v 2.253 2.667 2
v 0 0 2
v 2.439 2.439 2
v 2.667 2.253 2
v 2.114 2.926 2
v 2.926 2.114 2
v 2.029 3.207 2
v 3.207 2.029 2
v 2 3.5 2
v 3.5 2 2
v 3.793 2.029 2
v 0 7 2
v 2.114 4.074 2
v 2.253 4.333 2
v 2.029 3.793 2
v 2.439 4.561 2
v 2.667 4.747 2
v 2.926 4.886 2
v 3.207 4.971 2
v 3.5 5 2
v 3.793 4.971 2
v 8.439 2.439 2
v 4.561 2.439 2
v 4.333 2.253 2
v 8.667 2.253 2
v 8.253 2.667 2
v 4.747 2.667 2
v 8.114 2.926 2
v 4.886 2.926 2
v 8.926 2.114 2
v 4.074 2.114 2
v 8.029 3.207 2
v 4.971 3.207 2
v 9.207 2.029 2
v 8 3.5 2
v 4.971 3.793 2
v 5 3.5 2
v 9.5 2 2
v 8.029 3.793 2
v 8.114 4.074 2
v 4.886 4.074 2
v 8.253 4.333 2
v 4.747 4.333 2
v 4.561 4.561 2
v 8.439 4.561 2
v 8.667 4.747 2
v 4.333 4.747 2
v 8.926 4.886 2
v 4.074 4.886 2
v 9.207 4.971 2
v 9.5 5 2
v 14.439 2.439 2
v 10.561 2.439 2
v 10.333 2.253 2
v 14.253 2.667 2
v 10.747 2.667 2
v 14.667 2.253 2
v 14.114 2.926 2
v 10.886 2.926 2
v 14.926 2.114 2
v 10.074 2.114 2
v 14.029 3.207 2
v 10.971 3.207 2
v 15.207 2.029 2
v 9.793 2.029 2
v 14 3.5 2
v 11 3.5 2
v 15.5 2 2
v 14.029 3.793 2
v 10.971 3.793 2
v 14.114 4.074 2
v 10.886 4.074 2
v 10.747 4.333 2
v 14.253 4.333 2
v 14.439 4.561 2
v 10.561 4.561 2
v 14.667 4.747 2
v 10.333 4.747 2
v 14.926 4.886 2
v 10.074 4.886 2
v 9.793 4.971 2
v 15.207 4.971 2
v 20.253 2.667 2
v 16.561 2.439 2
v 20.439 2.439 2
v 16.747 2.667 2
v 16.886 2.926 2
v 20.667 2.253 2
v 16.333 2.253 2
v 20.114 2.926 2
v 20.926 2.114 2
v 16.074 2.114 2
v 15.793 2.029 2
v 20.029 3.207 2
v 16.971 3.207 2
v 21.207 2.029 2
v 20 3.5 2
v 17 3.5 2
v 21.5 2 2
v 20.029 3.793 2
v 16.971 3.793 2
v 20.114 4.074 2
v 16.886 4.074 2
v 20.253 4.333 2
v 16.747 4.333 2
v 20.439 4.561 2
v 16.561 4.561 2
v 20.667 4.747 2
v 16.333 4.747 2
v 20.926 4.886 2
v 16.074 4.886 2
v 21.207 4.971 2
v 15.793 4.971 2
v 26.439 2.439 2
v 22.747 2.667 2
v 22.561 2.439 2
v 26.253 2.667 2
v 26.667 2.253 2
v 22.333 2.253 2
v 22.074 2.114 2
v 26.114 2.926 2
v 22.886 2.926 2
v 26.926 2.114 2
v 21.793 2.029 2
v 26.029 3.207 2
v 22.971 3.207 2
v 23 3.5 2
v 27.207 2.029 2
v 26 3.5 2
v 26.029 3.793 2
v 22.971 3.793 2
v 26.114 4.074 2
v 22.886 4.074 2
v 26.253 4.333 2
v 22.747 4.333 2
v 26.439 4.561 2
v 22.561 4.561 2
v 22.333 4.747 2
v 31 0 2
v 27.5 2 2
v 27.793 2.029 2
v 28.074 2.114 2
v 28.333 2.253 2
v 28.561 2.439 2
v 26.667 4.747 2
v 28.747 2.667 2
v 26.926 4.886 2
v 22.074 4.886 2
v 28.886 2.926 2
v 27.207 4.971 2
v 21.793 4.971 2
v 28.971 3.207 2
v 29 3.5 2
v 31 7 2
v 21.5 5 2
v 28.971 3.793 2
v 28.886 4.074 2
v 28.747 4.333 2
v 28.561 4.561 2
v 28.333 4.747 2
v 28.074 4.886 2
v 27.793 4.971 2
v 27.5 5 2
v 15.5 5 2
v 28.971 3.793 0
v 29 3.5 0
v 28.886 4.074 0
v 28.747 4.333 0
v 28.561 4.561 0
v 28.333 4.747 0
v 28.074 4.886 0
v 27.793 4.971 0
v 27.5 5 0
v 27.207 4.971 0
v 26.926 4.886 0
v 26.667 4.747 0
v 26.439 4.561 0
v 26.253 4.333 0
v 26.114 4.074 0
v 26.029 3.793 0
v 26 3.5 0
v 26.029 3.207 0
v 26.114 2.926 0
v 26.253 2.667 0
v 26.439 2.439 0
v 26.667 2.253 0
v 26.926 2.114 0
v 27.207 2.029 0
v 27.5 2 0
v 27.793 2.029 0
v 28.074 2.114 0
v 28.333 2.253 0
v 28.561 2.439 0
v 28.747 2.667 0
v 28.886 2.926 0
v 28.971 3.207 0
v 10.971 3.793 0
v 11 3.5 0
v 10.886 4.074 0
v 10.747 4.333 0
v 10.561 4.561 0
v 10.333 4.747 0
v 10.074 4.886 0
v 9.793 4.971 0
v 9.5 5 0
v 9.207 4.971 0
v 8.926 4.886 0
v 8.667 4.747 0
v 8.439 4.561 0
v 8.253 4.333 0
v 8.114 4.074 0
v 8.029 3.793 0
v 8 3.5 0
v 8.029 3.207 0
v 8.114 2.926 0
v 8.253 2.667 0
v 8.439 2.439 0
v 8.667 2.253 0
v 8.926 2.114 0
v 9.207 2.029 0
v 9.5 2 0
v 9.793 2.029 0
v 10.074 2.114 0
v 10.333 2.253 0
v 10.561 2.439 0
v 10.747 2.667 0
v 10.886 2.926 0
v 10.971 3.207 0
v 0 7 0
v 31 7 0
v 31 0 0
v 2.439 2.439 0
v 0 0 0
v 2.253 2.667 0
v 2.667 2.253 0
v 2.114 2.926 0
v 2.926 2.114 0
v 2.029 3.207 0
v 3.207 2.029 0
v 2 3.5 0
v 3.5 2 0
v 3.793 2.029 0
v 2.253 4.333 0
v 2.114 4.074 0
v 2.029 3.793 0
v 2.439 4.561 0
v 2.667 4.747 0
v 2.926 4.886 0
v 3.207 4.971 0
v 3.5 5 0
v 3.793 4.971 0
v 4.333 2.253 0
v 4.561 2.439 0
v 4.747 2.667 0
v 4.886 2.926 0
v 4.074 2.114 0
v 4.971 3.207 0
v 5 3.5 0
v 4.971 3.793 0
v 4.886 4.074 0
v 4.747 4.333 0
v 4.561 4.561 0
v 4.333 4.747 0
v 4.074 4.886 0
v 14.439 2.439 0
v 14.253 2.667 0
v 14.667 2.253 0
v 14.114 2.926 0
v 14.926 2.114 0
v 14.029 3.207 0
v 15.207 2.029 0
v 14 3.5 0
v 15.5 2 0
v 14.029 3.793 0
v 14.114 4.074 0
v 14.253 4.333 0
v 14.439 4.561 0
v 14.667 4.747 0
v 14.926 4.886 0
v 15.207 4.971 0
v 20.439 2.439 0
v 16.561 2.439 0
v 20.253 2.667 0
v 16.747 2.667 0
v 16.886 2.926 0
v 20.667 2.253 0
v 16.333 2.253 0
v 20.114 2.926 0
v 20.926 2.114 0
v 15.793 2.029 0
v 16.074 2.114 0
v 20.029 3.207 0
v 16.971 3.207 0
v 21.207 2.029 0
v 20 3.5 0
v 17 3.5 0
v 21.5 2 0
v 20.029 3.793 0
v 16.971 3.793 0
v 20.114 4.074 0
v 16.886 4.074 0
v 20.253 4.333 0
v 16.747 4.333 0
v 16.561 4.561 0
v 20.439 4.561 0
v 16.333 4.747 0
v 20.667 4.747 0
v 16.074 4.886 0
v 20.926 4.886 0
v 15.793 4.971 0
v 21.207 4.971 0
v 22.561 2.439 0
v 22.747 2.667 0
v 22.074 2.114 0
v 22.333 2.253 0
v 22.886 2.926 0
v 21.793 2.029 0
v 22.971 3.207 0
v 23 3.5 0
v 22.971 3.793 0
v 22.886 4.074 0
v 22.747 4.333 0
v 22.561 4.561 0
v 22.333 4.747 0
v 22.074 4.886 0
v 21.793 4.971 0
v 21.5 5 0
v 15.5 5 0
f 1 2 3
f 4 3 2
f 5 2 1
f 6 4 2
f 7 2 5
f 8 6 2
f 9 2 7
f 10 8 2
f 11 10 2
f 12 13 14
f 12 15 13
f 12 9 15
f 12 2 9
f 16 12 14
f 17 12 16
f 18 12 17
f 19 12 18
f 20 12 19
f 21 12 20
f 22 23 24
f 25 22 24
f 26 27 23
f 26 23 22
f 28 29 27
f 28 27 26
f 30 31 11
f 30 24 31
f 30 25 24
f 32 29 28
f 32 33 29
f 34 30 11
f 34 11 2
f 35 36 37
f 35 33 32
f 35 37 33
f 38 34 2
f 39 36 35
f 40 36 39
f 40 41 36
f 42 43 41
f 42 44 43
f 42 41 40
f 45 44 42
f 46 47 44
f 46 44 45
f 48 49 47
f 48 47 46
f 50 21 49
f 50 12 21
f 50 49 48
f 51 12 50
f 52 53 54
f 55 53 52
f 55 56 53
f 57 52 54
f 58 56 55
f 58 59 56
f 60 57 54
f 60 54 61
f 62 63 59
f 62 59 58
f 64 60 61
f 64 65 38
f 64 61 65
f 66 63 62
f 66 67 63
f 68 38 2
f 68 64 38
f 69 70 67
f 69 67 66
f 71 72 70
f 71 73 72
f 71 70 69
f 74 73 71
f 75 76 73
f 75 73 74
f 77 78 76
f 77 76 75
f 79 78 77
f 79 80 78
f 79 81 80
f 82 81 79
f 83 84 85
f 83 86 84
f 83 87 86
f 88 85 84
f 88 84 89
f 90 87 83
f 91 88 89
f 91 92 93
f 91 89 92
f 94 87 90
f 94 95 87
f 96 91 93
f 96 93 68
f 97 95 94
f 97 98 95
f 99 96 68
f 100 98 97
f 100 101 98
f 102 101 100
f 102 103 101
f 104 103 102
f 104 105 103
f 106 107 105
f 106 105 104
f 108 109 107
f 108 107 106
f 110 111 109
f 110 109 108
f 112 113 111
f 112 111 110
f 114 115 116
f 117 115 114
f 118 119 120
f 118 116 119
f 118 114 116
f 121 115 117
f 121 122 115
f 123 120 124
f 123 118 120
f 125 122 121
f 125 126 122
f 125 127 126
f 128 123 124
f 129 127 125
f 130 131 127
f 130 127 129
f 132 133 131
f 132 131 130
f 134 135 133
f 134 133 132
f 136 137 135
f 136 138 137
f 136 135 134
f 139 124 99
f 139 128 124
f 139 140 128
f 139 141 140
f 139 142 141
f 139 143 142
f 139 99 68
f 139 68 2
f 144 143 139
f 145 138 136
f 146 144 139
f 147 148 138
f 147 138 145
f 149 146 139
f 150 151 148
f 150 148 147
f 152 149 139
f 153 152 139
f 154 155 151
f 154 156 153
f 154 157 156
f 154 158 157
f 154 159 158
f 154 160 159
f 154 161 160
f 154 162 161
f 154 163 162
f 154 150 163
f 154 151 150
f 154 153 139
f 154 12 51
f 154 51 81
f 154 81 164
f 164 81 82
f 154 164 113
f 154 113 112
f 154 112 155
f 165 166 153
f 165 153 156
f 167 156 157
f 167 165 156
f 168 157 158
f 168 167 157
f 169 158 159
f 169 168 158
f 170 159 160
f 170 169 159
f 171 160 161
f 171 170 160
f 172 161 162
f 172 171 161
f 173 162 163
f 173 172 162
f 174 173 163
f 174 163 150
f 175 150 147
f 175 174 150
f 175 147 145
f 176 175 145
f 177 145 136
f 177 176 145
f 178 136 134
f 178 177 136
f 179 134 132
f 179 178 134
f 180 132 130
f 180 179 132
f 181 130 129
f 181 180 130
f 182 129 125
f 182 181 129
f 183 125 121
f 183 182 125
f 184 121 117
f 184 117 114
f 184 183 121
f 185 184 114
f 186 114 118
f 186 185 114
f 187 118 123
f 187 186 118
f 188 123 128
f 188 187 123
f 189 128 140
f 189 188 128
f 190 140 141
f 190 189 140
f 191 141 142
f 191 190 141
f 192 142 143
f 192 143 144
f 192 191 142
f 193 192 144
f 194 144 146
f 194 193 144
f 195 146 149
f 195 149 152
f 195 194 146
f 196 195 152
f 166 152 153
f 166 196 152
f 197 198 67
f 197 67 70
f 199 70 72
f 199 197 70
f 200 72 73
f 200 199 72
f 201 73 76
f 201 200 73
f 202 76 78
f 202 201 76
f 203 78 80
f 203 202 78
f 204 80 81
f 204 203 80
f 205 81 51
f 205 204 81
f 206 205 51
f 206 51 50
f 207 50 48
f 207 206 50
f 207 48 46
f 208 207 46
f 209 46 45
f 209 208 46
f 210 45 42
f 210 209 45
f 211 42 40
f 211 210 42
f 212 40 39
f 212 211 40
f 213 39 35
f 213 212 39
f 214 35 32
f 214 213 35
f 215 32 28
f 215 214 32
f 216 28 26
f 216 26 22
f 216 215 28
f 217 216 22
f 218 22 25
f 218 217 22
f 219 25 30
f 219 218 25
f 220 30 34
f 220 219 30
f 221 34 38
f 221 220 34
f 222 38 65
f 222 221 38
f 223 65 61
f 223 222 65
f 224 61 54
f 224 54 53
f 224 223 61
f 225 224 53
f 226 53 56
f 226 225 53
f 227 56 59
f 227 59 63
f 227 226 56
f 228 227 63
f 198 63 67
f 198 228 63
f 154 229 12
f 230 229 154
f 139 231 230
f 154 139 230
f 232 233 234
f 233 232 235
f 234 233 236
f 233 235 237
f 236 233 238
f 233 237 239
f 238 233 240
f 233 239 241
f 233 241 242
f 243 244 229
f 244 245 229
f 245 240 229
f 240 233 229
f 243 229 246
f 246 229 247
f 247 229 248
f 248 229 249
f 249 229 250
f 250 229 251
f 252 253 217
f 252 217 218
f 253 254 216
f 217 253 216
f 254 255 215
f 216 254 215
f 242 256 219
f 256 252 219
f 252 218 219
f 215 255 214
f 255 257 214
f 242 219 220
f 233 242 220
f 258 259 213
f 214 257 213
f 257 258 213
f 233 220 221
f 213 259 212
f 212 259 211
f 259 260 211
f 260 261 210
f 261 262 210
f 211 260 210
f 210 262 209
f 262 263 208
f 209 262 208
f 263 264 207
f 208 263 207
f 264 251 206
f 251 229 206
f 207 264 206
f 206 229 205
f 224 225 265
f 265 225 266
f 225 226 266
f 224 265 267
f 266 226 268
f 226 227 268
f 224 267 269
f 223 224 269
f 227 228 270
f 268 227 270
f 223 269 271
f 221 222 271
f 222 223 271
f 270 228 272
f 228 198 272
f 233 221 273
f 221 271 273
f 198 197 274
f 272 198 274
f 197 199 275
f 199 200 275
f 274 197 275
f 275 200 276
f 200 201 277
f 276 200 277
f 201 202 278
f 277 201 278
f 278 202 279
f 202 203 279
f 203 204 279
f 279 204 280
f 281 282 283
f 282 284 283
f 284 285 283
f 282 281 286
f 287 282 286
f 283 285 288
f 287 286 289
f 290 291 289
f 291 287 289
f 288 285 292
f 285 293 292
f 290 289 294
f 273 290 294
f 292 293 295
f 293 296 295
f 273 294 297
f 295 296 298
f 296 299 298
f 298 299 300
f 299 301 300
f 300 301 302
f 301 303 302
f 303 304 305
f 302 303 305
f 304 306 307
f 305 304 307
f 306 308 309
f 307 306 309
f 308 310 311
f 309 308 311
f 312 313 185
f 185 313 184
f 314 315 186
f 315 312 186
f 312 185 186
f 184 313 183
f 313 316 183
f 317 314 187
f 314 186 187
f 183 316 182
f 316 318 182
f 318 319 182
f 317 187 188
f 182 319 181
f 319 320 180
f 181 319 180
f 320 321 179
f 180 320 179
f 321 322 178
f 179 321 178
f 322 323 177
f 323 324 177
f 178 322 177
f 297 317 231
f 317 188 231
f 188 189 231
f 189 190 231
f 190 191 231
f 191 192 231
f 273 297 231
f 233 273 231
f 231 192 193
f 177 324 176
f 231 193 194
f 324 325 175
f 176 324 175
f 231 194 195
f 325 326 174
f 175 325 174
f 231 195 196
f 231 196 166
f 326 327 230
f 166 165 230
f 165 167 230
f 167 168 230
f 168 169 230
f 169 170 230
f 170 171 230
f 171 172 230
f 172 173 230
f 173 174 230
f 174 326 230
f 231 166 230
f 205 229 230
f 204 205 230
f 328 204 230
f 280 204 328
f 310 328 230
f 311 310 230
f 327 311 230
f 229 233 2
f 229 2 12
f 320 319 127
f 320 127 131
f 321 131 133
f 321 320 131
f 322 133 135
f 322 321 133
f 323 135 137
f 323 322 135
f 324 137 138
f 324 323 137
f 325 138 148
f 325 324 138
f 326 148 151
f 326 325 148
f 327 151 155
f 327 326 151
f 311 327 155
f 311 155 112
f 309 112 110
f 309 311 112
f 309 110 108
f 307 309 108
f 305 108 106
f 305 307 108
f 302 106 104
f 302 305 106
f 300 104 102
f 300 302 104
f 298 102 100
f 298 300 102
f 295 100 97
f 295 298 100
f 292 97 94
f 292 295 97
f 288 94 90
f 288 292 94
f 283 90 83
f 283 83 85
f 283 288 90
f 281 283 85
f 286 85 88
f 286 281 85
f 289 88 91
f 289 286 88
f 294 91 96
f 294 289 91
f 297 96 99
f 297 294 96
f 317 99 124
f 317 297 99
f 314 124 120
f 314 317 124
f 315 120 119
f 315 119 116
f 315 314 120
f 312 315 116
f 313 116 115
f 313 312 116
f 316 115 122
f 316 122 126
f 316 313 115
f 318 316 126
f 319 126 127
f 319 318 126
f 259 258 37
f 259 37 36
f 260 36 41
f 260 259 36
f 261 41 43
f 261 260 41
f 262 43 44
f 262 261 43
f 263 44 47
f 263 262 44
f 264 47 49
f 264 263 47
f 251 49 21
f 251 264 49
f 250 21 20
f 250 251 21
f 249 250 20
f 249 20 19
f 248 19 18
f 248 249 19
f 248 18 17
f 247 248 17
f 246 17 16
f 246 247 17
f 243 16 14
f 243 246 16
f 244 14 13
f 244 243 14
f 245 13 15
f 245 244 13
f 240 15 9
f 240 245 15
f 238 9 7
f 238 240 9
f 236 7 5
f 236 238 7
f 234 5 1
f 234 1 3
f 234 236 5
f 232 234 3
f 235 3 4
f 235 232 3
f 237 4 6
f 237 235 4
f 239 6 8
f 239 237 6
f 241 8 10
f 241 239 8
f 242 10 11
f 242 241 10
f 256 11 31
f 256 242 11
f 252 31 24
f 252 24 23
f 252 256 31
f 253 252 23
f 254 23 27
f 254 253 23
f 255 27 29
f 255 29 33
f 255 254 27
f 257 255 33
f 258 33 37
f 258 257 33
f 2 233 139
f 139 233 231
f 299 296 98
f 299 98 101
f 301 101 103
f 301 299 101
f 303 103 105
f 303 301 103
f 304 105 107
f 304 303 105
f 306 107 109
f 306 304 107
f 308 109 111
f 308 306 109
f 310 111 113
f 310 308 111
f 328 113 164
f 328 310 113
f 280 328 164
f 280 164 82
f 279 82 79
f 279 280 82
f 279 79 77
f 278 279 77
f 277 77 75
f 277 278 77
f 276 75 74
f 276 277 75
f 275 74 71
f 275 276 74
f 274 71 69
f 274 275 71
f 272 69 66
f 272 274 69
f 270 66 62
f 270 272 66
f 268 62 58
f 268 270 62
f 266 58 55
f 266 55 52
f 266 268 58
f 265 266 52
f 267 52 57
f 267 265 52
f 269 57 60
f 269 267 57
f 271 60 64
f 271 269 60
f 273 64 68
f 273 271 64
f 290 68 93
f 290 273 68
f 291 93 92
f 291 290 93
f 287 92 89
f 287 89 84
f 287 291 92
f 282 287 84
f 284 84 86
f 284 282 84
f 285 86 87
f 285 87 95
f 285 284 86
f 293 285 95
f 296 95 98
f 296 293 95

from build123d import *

# Parameters (mm, degrees)
CYLINDER002_R     = 1.5
CYLINDER002_DEPTH = 2
CYLINDER003_R     = 1.5
CYLINDER003_DEPTH = 2
CYLINDER004_R     = 1.5
CYLINDER004_DEPTH = 2
CYLINDER001_R     = 1.5
CYLINDER001_DEPTH = 2
CYLINDER_R        = 1.5
CYLINDER_DEPTH    = 2
BOX_W             = 31
BOX_H             = 7
BOX_DEPTH         = 2


with BuildPart() as cylinder002:
    # Cylinder002 → Cylinder002 (new body)
    with BuildSketch(Plane(origin=(15.5, 3.5, 0), x_dir=(1, 0, 0), z_dir=(0, 0, 1))):
        Circle(CYLINDER002_R)
    extrude(amount=CYLINDER002_DEPTH)


with BuildPart() as cylinder003:
    # Cylinder003 → Cylinder003 (new body)
    with BuildSketch(Plane(origin=(21.5, 3.5, 0), x_dir=(1, 0, 0), z_dir=(0, 0, 1))):
        Circle(CYLINDER003_R)
    extrude(amount=CYLINDER003_DEPTH)


with BuildPart() as cylinder004:
    # Cylinder004 → Cylinder004 (new body)
    with BuildSketch(Plane(origin=(9.5, 3.5, 0), x_dir=(1, 0, 0), z_dir=(0, 0, 1))):
        Circle(CYLINDER004_R)
    extrude(amount=CYLINDER004_DEPTH)


with BuildPart() as cylinder001:
    # Cylinder001 → Cylinder001 (new body)
    with BuildSketch(Plane(origin=(27.5, 3.5, 0), x_dir=(1, 0, 0), z_dir=(0, 0, 1))):
        Circle(CYLINDER001_R)
    extrude(amount=CYLINDER001_DEPTH)


with BuildPart() as cylinder:
    # Cylinder → Cylinder (new body)
    with BuildSketch(Plane(origin=(3.5, 3.5, 0), x_dir=(1, 0, 0), z_dir=(0, 0, 1))):
        Circle(CYLINDER_R)
    extrude(amount=CYLINDER_DEPTH)


with BuildPart() as cut004:
    # Box → Box (new body)
    with BuildSketch(Plane.XY):
        with Locations((15.5, 3.5)):
            Rectangle(BOX_W, BOX_H)
    extrude(amount=BOX_DEPTH)

    # Cut: cut Cylinder
    add(cylinder.part, mode=Mode.SUBTRACT)

    # Cut001: cut Cylinder001
    add(cylinder001.part, mode=Mode.SUBTRACT)

    # Cut002: cut Cylinder004
    add(cylinder004.part, mode=Mode.SUBTRACT)

    # Cut003: cut Cylinder003
    add(cylinder003.part, mode=Mode.SUBTRACT)

    # Cut004: cut Cylinder002
    add(cylinder002.part, mode=Mode.SUBTRACT)


solid = cut004.part
